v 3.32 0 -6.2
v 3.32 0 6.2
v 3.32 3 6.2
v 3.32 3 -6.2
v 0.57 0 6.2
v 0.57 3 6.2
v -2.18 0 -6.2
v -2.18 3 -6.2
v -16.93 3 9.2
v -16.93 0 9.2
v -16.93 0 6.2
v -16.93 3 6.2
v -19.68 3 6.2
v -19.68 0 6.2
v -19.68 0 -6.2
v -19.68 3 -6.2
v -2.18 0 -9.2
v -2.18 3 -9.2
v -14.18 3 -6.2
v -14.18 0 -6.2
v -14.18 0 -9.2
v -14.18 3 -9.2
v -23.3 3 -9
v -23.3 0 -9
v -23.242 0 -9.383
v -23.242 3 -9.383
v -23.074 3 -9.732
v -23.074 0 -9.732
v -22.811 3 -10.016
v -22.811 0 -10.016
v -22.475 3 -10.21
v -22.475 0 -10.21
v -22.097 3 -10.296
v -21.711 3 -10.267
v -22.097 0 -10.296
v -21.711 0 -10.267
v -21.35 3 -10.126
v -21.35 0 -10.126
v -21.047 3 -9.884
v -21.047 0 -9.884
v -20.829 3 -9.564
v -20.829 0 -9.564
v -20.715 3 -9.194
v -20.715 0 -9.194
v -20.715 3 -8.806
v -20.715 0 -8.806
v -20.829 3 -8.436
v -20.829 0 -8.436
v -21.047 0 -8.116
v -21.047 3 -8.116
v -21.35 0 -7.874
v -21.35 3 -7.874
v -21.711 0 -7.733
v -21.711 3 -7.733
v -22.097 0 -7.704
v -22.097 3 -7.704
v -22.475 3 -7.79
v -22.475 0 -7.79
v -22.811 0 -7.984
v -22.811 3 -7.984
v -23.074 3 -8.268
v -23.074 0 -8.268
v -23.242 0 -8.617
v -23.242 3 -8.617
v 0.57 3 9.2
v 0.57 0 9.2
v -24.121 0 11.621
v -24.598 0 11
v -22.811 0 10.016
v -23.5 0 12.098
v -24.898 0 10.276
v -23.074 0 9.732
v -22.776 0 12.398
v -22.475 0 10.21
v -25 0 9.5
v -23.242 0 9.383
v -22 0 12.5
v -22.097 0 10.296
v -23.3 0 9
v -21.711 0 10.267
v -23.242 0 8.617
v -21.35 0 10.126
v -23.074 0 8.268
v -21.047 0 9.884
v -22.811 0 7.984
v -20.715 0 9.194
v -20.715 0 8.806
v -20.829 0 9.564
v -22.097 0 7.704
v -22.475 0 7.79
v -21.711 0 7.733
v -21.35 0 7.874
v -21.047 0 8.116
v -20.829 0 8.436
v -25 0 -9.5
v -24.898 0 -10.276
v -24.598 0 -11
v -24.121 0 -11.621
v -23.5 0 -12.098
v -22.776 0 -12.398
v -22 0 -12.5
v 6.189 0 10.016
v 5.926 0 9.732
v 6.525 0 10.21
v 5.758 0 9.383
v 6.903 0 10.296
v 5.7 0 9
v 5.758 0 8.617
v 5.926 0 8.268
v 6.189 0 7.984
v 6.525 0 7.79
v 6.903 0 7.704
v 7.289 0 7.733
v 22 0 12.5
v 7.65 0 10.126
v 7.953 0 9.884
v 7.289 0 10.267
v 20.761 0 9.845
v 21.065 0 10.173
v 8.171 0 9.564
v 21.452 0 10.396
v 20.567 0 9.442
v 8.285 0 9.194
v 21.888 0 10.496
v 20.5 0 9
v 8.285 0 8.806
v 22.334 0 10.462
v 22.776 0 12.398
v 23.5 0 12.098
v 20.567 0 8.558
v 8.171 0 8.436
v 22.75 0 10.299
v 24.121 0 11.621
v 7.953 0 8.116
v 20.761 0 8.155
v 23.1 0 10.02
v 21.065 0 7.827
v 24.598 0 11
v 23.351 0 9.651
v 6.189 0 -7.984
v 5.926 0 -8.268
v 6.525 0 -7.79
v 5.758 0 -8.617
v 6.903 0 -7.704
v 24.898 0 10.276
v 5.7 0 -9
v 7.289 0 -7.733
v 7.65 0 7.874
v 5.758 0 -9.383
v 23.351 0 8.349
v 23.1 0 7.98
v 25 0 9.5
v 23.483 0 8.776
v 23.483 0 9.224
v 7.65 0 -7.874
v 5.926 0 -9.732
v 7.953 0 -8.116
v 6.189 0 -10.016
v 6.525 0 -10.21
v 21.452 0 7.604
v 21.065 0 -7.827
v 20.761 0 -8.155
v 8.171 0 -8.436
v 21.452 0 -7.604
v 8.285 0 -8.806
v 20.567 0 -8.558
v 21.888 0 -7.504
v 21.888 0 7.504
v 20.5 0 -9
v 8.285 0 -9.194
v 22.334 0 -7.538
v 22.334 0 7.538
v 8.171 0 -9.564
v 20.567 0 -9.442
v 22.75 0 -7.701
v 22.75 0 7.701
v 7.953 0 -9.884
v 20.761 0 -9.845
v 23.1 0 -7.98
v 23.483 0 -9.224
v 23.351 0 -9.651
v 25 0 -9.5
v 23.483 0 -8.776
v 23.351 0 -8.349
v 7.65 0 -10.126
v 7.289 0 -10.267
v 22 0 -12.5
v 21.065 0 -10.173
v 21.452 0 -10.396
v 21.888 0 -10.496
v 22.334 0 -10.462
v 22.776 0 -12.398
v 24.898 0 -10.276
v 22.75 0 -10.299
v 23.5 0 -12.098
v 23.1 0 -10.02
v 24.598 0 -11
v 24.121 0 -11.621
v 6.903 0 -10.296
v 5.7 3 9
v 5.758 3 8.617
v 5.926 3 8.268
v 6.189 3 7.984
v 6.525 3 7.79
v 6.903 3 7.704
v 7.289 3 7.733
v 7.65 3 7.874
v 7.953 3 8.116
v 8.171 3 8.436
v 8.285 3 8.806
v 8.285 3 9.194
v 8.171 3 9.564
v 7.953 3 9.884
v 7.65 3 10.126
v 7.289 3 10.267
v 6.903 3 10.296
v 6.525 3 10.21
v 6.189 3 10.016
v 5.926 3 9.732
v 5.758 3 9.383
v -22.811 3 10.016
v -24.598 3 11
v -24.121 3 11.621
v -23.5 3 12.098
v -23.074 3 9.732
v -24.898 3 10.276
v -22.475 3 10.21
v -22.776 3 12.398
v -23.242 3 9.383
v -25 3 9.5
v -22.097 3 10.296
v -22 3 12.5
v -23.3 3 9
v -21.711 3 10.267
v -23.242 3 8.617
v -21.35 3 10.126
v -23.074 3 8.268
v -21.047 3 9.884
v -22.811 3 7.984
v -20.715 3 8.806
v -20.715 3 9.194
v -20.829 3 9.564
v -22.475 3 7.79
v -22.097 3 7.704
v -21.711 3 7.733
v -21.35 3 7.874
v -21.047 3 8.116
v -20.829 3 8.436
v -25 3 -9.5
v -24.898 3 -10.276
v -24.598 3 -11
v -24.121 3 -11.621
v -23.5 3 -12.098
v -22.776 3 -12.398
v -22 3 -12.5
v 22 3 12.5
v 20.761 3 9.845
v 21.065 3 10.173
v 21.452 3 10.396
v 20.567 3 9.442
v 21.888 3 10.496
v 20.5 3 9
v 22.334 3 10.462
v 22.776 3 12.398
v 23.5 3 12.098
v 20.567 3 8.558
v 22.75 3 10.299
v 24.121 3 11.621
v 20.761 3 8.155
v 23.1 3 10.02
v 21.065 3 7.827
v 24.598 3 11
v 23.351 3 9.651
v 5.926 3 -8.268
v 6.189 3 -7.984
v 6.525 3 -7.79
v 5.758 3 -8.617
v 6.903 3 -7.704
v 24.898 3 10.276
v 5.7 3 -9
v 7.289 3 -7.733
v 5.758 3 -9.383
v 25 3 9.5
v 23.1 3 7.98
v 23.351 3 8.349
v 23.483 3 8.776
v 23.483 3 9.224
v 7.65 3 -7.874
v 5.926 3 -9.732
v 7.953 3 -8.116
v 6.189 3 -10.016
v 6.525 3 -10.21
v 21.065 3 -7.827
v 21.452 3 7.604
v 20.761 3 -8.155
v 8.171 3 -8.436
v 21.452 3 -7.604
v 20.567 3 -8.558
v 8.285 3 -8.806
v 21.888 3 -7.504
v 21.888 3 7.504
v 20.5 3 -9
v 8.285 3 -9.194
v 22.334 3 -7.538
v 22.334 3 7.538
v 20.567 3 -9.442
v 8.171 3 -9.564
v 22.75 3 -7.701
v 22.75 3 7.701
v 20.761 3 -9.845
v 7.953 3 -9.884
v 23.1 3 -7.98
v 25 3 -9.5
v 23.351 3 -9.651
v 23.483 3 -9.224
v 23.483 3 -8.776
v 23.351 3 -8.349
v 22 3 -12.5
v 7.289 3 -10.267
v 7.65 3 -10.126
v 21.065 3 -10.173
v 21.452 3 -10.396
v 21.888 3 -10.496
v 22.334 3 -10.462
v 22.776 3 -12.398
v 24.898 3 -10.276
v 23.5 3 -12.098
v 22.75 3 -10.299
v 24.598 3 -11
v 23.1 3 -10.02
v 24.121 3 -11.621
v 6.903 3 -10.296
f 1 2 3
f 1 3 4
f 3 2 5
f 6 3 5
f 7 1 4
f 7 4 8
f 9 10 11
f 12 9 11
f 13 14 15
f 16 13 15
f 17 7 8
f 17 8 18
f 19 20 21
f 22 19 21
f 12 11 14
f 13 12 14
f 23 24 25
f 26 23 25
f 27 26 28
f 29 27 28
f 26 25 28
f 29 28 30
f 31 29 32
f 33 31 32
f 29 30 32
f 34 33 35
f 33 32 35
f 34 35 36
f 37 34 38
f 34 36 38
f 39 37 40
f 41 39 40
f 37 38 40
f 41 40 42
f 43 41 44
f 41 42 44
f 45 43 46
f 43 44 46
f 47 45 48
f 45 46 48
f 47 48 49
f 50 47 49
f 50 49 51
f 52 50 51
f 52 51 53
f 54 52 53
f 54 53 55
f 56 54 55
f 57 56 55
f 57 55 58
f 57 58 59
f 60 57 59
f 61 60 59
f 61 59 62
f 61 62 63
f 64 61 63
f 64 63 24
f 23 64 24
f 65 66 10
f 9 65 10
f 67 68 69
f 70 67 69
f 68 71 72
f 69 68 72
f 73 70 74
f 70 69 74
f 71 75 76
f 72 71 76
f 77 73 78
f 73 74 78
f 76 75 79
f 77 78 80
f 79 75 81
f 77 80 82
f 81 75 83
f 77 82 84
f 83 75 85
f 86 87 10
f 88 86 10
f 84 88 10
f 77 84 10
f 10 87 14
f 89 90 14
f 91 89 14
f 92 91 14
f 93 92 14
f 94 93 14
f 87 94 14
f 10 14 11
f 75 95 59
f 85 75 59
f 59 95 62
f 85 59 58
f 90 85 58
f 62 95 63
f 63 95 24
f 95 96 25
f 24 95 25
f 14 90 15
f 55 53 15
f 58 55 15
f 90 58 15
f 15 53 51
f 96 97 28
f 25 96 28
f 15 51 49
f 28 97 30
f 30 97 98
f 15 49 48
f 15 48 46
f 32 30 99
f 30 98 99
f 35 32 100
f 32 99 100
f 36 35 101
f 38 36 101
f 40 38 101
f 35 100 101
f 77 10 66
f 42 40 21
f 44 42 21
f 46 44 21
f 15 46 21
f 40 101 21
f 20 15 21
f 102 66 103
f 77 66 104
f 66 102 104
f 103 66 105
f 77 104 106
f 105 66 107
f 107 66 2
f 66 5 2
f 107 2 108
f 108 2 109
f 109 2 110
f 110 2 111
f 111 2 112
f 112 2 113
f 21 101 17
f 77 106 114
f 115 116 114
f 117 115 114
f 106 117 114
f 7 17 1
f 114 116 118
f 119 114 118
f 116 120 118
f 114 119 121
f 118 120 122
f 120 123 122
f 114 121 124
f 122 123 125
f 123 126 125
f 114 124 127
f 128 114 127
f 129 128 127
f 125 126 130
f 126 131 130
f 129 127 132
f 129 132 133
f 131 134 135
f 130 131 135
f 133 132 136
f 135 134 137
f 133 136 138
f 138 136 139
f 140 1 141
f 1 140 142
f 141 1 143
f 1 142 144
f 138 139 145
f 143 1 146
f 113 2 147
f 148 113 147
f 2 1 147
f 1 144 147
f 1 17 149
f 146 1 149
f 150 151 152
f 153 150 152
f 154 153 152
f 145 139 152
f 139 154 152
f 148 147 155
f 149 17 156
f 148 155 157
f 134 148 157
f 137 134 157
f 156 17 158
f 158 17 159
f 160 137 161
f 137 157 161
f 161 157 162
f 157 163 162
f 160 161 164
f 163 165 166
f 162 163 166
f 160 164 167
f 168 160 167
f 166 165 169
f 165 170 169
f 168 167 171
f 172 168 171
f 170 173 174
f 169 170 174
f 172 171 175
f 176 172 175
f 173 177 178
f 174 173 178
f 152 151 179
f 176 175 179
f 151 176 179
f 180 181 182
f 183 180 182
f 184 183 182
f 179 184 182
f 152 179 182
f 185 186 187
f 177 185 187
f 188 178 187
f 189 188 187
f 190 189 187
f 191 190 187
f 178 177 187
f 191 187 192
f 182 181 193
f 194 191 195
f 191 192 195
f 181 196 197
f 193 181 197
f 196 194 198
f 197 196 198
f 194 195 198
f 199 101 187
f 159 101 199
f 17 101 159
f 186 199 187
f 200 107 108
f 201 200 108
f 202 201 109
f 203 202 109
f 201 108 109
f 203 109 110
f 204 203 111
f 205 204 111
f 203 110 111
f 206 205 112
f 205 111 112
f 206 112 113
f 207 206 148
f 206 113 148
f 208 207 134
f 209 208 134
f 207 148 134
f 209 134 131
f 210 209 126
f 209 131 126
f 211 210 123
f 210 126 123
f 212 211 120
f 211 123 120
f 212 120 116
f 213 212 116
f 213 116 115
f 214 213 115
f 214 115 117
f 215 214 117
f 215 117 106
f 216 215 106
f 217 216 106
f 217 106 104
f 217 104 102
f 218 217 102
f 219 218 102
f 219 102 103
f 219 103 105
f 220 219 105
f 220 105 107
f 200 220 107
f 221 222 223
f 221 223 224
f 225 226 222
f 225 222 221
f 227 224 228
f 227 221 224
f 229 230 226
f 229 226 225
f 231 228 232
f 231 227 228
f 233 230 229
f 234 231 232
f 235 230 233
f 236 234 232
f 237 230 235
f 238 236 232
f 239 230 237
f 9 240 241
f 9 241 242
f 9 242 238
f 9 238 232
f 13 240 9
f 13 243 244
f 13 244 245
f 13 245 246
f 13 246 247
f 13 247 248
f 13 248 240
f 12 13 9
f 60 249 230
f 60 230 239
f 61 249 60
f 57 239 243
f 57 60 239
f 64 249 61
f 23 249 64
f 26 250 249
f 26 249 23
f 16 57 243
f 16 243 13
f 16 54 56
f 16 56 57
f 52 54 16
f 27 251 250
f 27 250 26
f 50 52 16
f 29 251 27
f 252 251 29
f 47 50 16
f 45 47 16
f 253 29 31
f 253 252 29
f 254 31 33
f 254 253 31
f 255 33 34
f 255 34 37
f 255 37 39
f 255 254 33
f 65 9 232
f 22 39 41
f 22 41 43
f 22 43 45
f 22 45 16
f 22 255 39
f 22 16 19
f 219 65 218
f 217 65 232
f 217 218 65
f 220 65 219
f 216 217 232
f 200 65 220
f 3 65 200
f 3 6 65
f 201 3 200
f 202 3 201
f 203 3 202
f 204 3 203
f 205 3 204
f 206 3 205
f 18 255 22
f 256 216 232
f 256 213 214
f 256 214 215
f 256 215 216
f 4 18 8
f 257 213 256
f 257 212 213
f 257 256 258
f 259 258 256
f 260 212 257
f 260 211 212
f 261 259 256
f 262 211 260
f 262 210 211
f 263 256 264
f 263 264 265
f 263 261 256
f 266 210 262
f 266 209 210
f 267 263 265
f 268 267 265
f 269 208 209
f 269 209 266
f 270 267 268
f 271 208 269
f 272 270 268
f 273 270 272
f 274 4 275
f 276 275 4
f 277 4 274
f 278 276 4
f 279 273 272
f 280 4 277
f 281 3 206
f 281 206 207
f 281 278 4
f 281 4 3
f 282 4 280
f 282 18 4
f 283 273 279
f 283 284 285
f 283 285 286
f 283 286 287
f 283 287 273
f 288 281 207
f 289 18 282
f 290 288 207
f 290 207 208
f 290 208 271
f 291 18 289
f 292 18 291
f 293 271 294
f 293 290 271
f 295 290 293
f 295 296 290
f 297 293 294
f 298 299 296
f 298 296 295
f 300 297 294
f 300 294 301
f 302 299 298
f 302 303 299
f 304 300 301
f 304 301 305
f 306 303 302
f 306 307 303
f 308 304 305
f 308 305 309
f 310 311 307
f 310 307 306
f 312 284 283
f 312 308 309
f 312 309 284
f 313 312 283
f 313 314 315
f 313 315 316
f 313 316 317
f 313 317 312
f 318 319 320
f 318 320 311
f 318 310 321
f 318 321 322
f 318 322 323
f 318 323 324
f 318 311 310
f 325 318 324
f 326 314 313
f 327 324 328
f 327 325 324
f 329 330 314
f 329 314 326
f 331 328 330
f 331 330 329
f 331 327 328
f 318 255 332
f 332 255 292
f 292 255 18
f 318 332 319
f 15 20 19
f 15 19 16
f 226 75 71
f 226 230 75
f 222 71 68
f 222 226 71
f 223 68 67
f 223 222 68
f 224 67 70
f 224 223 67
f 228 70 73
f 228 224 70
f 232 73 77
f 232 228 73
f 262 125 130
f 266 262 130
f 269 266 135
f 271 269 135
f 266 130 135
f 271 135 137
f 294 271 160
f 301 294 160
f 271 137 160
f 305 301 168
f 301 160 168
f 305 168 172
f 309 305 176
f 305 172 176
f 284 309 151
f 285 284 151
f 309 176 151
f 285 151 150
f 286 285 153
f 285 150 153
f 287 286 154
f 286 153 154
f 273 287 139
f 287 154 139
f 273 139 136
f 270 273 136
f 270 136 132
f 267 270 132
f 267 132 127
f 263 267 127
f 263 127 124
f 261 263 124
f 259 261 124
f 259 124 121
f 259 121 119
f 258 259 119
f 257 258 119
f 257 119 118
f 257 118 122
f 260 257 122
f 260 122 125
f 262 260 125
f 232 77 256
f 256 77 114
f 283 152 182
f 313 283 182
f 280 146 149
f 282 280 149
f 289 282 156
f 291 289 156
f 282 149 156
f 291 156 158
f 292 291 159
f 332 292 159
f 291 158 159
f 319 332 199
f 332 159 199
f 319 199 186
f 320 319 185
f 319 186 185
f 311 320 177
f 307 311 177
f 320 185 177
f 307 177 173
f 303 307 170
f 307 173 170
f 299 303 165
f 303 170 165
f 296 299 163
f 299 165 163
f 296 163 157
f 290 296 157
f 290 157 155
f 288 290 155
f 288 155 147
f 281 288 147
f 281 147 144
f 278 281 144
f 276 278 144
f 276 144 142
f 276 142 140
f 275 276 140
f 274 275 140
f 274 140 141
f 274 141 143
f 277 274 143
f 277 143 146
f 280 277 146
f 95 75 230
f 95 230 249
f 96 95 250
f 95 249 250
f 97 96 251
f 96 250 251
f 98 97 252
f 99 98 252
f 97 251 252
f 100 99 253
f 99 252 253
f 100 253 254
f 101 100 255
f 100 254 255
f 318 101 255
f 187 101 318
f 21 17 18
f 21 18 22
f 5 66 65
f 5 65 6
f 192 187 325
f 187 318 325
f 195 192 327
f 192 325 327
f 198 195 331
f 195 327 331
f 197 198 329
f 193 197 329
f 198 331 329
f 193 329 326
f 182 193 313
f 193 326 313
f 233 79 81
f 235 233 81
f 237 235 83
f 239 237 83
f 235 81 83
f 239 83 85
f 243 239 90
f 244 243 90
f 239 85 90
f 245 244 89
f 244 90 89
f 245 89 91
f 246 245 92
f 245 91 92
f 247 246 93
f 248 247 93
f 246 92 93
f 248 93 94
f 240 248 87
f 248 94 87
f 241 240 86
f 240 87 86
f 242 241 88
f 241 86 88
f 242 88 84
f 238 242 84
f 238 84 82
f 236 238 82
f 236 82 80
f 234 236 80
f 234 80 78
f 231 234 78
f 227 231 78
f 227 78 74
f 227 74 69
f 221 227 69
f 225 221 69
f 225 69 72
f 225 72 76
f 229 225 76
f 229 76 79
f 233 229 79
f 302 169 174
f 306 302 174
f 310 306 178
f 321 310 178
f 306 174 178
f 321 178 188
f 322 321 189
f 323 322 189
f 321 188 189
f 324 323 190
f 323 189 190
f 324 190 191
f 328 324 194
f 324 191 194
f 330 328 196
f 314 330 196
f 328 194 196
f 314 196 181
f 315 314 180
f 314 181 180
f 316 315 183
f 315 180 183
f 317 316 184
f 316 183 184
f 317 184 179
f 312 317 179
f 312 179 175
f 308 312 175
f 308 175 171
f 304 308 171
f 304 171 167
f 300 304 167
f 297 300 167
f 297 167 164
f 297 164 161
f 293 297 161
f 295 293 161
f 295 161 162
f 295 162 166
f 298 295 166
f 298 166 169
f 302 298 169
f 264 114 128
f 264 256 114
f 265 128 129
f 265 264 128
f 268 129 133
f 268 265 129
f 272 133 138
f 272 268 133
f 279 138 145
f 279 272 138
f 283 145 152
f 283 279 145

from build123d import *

# Parameters (mm, degrees)
PERFIL_PRINCIPAL_W           = 50
PERFIL_PRINCIPAL_H           = 25
BASE_DEPTH                   = 3
PERFIL_CORTE_W               = 23
PERFIL_CORTE_H               = 12.4
CORTE_PRINCIPAL_DEPTH        = 82.921801368
ESBO_O7_W                    = 12
ESBO_O7_H                    = 3
ESBO_O7_W_2                  = 17.5
CORTE_EXTRUS_O3_DEPTH        = 91.332942436
FURO_DE_DI_METRO_3_0_3_1_D   = 3
FURO_DE_DI_METRO_2_6_2_6_1_D = 2.6
FILETE1_R                    = 3


with BuildPart() as part:
    # Perfil Principal → Base (new body)
    with BuildSketch(Plane(origin=(0, 0, 0), x_dir=(1, 0, 0), z_dir=(0, 1, 0))):
        Rectangle(PERFIL_PRINCIPAL_W, PERFIL_PRINCIPAL_H)
    extrude(amount=BASE_DEPTH)

    # Perfil Corte → Corte Principal (cut, through all)
    with BuildSketch(Plane(origin=(49.188016516, 0, 22.11675526), x_dir=(-1, 0, 0), z_dir=(0, -1, 0))):
        with Locations((57.368016516, 22.11675526)):
            Rectangle(PERFIL_CORTE_W, PERFIL_CORTE_H)
    extrude(amount=-CORTE_PRINCIPAL_DEPTH, mode=Mode.SUBTRACT)

    # Esboço7 → Corte-extrusão3 (cut, through all)
    with BuildSketch(Plane(origin=(56.452995871, 0, 26.44162237), x_dir=(-1, 0, 0), z_dir=(0, -1, 0))):
        with Locations((64.632995871, 34.14162237)):
            Rectangle(ESBO_O7_W, ESBO_O7_H)
        with Locations((64.632995871, 18.74162237)):
            Rectangle(ESBO_O7_W_2, ESBO_O7_H)
    extrude(amount=-CORTE_EXTRUS_O3_DEPTH, mode=Mode.SUBTRACT)

    # Furo de diâmetro Ø3.0 (3)1 (through all)
    with Locations(Plane(origin=(0, 3, 0), x_dir=(1, 0, 0), z_dir=(0, 1, 0))):
        with Locations((22, 9), (22, -9)):
            Hole(FURO_DE_DI_METRO_3_0_3_1_D / 2)

    # Furo de diâmetro Ø2.6 (2.6)1 (through all)
    with Locations(Plane(origin=(0, 3, 0), x_dir=(1, 0, 0), z_dir=(0, 1, 0))):
        with Locations((-22, 9), (-22, -9), (7, 9), (7, -9)):
            Hole(FURO_DE_DI_METRO_2_6_2_6_1_D / 2)

    # Filete1
    filete1_edges = [part.edges().sort_by_distance(p)[0] for p in [
        (-25, 1.5, 12.5),
        (-25, 1.5, -12.5),
        (25, 1.5, -12.5),
        (25, 1.5, 12.5),
    ]]
    fillet(filete1_edges, radius=FILETE1_R)


solid = part.part
